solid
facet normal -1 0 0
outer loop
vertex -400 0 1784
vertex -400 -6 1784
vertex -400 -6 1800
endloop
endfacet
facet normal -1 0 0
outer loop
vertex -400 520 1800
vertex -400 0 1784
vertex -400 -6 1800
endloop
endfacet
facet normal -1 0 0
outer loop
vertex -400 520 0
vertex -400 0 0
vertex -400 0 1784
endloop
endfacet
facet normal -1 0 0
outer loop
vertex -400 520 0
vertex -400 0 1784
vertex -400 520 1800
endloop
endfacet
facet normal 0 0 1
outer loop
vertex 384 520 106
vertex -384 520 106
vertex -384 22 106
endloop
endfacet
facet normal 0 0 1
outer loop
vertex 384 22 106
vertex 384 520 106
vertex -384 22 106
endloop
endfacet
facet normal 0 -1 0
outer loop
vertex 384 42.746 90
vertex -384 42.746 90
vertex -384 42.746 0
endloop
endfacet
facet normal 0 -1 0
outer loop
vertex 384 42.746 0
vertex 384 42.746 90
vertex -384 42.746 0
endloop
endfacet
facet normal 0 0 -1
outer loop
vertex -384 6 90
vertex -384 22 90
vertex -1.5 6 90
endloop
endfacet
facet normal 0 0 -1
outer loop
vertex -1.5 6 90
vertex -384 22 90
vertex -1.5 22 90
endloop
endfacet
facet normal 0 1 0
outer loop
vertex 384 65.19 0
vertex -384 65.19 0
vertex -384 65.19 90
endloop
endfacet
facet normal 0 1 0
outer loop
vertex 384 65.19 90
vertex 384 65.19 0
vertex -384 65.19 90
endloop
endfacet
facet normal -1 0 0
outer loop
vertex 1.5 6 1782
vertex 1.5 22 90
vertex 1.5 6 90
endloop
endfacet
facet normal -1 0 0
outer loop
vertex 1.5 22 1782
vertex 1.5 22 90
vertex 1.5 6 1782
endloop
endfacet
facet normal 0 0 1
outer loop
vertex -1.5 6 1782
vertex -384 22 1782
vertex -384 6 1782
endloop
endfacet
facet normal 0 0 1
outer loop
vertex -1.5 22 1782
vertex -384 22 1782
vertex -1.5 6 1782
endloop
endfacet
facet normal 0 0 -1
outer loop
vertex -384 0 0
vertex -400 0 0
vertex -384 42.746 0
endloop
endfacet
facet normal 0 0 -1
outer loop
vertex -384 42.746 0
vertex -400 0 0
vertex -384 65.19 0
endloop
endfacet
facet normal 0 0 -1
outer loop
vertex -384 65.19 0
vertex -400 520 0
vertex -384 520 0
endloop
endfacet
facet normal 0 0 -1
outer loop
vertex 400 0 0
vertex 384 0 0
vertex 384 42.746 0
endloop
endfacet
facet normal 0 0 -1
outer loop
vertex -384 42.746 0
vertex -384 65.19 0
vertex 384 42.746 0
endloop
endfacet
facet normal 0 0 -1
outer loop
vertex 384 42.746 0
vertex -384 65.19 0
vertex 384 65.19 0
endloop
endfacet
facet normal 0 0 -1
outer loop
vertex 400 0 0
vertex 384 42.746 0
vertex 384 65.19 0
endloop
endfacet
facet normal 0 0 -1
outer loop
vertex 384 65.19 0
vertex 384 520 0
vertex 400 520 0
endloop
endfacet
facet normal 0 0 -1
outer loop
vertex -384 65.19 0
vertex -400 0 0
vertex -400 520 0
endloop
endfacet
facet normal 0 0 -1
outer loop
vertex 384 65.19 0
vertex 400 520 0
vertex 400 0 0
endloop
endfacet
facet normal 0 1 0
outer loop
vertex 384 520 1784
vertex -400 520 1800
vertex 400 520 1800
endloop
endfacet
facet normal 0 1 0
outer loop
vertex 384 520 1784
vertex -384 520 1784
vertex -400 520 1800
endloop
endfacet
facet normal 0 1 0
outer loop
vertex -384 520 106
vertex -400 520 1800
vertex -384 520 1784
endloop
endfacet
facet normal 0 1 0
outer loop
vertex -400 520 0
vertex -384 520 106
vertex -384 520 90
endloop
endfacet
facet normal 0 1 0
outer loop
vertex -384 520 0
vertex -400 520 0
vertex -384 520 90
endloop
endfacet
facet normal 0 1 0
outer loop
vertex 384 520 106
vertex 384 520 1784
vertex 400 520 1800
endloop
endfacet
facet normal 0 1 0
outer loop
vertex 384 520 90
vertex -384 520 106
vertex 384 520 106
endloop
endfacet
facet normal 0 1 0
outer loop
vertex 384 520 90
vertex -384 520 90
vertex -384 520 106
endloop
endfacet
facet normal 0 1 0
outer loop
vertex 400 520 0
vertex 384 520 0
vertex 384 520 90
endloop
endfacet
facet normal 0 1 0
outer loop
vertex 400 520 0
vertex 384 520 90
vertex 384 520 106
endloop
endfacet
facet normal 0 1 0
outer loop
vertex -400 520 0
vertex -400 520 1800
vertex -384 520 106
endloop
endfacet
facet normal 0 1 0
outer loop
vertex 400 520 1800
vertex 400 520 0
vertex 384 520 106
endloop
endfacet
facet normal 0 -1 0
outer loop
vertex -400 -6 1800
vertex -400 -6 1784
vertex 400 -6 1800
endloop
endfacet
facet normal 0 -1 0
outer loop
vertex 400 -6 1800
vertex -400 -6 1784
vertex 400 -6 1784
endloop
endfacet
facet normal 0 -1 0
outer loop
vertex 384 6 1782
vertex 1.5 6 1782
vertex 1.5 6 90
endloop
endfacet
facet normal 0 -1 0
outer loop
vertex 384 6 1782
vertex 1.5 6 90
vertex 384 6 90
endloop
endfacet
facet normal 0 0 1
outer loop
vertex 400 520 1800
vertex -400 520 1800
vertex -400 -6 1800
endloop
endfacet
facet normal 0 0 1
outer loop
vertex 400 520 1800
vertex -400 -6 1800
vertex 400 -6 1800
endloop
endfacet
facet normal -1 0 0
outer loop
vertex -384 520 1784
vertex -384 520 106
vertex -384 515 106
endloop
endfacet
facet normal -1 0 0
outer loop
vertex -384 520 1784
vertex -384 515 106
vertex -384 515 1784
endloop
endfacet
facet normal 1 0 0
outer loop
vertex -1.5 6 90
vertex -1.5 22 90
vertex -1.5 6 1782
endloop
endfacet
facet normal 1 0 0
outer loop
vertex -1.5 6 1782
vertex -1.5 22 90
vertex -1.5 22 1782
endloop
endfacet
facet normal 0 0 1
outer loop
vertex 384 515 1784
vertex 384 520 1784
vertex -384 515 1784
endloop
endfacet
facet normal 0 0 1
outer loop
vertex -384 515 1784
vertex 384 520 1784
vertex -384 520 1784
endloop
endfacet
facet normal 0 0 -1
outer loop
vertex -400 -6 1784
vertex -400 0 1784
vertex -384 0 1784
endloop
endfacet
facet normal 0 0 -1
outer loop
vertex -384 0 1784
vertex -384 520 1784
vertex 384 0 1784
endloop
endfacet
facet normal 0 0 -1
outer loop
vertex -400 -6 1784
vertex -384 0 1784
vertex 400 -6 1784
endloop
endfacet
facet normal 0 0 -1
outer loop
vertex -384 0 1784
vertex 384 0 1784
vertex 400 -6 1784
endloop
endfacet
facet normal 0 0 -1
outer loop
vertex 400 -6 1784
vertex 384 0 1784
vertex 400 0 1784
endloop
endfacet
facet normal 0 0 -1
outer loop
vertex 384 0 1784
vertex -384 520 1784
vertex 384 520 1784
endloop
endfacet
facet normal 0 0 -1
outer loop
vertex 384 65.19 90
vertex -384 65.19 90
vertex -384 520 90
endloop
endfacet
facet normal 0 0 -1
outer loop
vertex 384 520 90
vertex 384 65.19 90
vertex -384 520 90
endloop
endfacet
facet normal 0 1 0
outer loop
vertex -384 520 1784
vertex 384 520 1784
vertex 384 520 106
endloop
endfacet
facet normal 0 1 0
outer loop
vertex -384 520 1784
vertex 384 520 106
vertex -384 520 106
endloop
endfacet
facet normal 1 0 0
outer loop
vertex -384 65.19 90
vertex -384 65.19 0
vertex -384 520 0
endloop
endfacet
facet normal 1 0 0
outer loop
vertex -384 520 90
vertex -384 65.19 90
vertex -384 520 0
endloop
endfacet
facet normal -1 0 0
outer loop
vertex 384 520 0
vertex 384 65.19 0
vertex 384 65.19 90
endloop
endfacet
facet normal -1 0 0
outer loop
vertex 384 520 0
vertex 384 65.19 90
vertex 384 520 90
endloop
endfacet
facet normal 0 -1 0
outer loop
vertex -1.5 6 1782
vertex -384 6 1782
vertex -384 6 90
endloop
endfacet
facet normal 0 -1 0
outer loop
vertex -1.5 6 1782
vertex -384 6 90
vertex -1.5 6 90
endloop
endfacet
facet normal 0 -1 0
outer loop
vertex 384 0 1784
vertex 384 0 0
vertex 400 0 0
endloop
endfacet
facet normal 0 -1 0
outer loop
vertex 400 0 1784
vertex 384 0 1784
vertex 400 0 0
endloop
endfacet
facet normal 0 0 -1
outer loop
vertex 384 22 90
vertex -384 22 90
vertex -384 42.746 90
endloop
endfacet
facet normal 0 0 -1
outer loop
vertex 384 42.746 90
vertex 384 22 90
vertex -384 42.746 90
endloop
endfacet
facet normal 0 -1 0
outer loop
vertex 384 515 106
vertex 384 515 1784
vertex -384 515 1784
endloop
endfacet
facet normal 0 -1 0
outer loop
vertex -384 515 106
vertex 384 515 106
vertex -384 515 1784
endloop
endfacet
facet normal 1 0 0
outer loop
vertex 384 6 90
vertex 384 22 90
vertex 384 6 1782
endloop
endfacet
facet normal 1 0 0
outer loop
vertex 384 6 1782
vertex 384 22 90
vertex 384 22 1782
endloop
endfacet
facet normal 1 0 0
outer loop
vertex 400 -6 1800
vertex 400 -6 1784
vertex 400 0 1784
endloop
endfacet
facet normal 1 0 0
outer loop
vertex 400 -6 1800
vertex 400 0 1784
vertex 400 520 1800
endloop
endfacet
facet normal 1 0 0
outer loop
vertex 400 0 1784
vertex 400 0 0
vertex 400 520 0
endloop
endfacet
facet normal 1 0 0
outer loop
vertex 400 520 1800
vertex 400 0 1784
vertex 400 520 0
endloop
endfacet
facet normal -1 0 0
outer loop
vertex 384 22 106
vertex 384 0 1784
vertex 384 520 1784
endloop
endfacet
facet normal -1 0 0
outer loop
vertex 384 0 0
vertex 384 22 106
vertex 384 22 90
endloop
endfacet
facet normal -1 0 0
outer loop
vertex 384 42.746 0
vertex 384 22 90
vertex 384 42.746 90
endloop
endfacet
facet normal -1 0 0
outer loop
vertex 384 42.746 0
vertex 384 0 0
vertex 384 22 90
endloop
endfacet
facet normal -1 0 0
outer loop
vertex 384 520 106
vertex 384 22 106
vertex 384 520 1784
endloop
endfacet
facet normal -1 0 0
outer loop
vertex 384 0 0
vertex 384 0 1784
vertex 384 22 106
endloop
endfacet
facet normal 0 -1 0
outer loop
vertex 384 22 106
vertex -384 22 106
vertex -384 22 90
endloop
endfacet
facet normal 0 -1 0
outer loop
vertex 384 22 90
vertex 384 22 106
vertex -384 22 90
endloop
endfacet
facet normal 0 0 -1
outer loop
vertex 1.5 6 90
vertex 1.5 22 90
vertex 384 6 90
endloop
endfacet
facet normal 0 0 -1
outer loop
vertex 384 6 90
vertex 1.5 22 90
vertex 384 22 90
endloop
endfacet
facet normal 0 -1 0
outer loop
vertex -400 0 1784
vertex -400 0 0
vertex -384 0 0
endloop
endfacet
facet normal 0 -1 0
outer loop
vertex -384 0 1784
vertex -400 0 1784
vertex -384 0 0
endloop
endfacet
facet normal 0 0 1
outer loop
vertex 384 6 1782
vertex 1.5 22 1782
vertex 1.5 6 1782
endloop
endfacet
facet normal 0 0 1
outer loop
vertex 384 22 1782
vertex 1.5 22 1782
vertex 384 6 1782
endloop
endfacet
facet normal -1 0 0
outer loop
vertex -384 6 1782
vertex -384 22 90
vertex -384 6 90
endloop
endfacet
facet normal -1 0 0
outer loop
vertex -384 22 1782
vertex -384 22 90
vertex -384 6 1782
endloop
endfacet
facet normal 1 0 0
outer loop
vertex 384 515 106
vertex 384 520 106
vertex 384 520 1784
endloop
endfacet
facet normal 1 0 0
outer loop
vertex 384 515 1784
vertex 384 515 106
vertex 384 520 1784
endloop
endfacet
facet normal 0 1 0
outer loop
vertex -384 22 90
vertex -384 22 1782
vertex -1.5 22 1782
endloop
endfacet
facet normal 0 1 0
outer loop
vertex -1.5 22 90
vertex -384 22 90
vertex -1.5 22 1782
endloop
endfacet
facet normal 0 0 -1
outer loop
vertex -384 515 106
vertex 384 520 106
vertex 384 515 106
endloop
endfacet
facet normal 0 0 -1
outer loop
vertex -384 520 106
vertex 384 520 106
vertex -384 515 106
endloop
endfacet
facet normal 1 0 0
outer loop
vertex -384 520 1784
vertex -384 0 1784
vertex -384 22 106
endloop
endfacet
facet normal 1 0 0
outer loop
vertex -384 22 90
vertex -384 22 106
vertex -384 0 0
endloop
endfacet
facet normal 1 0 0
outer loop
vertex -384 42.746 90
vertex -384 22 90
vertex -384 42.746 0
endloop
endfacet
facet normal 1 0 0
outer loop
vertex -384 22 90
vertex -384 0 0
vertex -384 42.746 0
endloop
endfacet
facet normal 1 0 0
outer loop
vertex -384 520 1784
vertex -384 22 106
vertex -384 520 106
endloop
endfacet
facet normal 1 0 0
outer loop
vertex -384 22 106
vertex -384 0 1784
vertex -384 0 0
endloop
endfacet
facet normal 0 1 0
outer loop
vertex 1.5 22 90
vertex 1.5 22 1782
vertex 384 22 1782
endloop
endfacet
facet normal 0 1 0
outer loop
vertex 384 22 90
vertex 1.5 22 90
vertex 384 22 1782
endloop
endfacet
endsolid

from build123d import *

# Parameters (mm, degrees)
F0_W      = 16
F0_H      = 520
F1_DEPTH  = 1784
F2_W      = 800
F2_H      = 526
F3_DEPTH  = 16
F6_DEPTH  = 768
F7_W      = 768
F7_H      = 1678
F8_DEPTH  = 5
F9_W      = 382.5
F9_H      = 1692
F10_DEPTH = 16


with BuildPart() as f1:
    # F0 (on Top) → F1 (new body)
    with BuildSketch(Plane.XY):
        with Locations((-392, 260)):
            Rectangle(F0_W, F0_H)
        with Locations((392, 260)):
            Rectangle(F0_W, F0_H)
    extrude(amount=F1_DEPTH)


with BuildPart() as f3:
    # F2 (on face) → F3 (new body)
    with BuildSketch(Plane.XY.offset(1784)):
        with Locations((0, 257)):
            Rectangle(F2_W, F2_H)
    extrude(amount=F3_DEPTH)


with BuildPart() as f1_1:
    add(f1.part)

    # F4: union F3
    add(f3.part)

    # F5 (on face) → F6 (join, through all)
    with BuildSketch(Plane.YZ.offset(-384)):
        Polygon((65.190345, 90), (520, 90), (520, 106), (22, 106), (22, 90), (42.745929, 90), (42.745929, 0), (65.190345, 0), align=None)
    extrude(amount=F6_DEPTH)


with BuildPart() as f8:
    # F7 (on face) → F8 (new body)
    with BuildSketch(Plane(origin=(0, 520, 0), x_dir=(-1, 0, 0), z_dir=(0, 1, 0))):
        with Locations((0, 945)):
            Rectangle(F7_W, F7_H)
    extrude(amount=-F8_DEPTH)


with BuildPart() as f10:
    # F9 (on face) → F10 (new body)
    with BuildSketch(Plane.XZ.offset(-22)):
        with Locations((-192.75, 936)):
            Rectangle(F9_W, F9_H)
        with Locations((192.75, 936)):
            Rectangle(F9_W, F9_H)
    extrude(amount=F10_DEPTH)


solid = Compound([f1_1.part, f8.part, f10.part])
